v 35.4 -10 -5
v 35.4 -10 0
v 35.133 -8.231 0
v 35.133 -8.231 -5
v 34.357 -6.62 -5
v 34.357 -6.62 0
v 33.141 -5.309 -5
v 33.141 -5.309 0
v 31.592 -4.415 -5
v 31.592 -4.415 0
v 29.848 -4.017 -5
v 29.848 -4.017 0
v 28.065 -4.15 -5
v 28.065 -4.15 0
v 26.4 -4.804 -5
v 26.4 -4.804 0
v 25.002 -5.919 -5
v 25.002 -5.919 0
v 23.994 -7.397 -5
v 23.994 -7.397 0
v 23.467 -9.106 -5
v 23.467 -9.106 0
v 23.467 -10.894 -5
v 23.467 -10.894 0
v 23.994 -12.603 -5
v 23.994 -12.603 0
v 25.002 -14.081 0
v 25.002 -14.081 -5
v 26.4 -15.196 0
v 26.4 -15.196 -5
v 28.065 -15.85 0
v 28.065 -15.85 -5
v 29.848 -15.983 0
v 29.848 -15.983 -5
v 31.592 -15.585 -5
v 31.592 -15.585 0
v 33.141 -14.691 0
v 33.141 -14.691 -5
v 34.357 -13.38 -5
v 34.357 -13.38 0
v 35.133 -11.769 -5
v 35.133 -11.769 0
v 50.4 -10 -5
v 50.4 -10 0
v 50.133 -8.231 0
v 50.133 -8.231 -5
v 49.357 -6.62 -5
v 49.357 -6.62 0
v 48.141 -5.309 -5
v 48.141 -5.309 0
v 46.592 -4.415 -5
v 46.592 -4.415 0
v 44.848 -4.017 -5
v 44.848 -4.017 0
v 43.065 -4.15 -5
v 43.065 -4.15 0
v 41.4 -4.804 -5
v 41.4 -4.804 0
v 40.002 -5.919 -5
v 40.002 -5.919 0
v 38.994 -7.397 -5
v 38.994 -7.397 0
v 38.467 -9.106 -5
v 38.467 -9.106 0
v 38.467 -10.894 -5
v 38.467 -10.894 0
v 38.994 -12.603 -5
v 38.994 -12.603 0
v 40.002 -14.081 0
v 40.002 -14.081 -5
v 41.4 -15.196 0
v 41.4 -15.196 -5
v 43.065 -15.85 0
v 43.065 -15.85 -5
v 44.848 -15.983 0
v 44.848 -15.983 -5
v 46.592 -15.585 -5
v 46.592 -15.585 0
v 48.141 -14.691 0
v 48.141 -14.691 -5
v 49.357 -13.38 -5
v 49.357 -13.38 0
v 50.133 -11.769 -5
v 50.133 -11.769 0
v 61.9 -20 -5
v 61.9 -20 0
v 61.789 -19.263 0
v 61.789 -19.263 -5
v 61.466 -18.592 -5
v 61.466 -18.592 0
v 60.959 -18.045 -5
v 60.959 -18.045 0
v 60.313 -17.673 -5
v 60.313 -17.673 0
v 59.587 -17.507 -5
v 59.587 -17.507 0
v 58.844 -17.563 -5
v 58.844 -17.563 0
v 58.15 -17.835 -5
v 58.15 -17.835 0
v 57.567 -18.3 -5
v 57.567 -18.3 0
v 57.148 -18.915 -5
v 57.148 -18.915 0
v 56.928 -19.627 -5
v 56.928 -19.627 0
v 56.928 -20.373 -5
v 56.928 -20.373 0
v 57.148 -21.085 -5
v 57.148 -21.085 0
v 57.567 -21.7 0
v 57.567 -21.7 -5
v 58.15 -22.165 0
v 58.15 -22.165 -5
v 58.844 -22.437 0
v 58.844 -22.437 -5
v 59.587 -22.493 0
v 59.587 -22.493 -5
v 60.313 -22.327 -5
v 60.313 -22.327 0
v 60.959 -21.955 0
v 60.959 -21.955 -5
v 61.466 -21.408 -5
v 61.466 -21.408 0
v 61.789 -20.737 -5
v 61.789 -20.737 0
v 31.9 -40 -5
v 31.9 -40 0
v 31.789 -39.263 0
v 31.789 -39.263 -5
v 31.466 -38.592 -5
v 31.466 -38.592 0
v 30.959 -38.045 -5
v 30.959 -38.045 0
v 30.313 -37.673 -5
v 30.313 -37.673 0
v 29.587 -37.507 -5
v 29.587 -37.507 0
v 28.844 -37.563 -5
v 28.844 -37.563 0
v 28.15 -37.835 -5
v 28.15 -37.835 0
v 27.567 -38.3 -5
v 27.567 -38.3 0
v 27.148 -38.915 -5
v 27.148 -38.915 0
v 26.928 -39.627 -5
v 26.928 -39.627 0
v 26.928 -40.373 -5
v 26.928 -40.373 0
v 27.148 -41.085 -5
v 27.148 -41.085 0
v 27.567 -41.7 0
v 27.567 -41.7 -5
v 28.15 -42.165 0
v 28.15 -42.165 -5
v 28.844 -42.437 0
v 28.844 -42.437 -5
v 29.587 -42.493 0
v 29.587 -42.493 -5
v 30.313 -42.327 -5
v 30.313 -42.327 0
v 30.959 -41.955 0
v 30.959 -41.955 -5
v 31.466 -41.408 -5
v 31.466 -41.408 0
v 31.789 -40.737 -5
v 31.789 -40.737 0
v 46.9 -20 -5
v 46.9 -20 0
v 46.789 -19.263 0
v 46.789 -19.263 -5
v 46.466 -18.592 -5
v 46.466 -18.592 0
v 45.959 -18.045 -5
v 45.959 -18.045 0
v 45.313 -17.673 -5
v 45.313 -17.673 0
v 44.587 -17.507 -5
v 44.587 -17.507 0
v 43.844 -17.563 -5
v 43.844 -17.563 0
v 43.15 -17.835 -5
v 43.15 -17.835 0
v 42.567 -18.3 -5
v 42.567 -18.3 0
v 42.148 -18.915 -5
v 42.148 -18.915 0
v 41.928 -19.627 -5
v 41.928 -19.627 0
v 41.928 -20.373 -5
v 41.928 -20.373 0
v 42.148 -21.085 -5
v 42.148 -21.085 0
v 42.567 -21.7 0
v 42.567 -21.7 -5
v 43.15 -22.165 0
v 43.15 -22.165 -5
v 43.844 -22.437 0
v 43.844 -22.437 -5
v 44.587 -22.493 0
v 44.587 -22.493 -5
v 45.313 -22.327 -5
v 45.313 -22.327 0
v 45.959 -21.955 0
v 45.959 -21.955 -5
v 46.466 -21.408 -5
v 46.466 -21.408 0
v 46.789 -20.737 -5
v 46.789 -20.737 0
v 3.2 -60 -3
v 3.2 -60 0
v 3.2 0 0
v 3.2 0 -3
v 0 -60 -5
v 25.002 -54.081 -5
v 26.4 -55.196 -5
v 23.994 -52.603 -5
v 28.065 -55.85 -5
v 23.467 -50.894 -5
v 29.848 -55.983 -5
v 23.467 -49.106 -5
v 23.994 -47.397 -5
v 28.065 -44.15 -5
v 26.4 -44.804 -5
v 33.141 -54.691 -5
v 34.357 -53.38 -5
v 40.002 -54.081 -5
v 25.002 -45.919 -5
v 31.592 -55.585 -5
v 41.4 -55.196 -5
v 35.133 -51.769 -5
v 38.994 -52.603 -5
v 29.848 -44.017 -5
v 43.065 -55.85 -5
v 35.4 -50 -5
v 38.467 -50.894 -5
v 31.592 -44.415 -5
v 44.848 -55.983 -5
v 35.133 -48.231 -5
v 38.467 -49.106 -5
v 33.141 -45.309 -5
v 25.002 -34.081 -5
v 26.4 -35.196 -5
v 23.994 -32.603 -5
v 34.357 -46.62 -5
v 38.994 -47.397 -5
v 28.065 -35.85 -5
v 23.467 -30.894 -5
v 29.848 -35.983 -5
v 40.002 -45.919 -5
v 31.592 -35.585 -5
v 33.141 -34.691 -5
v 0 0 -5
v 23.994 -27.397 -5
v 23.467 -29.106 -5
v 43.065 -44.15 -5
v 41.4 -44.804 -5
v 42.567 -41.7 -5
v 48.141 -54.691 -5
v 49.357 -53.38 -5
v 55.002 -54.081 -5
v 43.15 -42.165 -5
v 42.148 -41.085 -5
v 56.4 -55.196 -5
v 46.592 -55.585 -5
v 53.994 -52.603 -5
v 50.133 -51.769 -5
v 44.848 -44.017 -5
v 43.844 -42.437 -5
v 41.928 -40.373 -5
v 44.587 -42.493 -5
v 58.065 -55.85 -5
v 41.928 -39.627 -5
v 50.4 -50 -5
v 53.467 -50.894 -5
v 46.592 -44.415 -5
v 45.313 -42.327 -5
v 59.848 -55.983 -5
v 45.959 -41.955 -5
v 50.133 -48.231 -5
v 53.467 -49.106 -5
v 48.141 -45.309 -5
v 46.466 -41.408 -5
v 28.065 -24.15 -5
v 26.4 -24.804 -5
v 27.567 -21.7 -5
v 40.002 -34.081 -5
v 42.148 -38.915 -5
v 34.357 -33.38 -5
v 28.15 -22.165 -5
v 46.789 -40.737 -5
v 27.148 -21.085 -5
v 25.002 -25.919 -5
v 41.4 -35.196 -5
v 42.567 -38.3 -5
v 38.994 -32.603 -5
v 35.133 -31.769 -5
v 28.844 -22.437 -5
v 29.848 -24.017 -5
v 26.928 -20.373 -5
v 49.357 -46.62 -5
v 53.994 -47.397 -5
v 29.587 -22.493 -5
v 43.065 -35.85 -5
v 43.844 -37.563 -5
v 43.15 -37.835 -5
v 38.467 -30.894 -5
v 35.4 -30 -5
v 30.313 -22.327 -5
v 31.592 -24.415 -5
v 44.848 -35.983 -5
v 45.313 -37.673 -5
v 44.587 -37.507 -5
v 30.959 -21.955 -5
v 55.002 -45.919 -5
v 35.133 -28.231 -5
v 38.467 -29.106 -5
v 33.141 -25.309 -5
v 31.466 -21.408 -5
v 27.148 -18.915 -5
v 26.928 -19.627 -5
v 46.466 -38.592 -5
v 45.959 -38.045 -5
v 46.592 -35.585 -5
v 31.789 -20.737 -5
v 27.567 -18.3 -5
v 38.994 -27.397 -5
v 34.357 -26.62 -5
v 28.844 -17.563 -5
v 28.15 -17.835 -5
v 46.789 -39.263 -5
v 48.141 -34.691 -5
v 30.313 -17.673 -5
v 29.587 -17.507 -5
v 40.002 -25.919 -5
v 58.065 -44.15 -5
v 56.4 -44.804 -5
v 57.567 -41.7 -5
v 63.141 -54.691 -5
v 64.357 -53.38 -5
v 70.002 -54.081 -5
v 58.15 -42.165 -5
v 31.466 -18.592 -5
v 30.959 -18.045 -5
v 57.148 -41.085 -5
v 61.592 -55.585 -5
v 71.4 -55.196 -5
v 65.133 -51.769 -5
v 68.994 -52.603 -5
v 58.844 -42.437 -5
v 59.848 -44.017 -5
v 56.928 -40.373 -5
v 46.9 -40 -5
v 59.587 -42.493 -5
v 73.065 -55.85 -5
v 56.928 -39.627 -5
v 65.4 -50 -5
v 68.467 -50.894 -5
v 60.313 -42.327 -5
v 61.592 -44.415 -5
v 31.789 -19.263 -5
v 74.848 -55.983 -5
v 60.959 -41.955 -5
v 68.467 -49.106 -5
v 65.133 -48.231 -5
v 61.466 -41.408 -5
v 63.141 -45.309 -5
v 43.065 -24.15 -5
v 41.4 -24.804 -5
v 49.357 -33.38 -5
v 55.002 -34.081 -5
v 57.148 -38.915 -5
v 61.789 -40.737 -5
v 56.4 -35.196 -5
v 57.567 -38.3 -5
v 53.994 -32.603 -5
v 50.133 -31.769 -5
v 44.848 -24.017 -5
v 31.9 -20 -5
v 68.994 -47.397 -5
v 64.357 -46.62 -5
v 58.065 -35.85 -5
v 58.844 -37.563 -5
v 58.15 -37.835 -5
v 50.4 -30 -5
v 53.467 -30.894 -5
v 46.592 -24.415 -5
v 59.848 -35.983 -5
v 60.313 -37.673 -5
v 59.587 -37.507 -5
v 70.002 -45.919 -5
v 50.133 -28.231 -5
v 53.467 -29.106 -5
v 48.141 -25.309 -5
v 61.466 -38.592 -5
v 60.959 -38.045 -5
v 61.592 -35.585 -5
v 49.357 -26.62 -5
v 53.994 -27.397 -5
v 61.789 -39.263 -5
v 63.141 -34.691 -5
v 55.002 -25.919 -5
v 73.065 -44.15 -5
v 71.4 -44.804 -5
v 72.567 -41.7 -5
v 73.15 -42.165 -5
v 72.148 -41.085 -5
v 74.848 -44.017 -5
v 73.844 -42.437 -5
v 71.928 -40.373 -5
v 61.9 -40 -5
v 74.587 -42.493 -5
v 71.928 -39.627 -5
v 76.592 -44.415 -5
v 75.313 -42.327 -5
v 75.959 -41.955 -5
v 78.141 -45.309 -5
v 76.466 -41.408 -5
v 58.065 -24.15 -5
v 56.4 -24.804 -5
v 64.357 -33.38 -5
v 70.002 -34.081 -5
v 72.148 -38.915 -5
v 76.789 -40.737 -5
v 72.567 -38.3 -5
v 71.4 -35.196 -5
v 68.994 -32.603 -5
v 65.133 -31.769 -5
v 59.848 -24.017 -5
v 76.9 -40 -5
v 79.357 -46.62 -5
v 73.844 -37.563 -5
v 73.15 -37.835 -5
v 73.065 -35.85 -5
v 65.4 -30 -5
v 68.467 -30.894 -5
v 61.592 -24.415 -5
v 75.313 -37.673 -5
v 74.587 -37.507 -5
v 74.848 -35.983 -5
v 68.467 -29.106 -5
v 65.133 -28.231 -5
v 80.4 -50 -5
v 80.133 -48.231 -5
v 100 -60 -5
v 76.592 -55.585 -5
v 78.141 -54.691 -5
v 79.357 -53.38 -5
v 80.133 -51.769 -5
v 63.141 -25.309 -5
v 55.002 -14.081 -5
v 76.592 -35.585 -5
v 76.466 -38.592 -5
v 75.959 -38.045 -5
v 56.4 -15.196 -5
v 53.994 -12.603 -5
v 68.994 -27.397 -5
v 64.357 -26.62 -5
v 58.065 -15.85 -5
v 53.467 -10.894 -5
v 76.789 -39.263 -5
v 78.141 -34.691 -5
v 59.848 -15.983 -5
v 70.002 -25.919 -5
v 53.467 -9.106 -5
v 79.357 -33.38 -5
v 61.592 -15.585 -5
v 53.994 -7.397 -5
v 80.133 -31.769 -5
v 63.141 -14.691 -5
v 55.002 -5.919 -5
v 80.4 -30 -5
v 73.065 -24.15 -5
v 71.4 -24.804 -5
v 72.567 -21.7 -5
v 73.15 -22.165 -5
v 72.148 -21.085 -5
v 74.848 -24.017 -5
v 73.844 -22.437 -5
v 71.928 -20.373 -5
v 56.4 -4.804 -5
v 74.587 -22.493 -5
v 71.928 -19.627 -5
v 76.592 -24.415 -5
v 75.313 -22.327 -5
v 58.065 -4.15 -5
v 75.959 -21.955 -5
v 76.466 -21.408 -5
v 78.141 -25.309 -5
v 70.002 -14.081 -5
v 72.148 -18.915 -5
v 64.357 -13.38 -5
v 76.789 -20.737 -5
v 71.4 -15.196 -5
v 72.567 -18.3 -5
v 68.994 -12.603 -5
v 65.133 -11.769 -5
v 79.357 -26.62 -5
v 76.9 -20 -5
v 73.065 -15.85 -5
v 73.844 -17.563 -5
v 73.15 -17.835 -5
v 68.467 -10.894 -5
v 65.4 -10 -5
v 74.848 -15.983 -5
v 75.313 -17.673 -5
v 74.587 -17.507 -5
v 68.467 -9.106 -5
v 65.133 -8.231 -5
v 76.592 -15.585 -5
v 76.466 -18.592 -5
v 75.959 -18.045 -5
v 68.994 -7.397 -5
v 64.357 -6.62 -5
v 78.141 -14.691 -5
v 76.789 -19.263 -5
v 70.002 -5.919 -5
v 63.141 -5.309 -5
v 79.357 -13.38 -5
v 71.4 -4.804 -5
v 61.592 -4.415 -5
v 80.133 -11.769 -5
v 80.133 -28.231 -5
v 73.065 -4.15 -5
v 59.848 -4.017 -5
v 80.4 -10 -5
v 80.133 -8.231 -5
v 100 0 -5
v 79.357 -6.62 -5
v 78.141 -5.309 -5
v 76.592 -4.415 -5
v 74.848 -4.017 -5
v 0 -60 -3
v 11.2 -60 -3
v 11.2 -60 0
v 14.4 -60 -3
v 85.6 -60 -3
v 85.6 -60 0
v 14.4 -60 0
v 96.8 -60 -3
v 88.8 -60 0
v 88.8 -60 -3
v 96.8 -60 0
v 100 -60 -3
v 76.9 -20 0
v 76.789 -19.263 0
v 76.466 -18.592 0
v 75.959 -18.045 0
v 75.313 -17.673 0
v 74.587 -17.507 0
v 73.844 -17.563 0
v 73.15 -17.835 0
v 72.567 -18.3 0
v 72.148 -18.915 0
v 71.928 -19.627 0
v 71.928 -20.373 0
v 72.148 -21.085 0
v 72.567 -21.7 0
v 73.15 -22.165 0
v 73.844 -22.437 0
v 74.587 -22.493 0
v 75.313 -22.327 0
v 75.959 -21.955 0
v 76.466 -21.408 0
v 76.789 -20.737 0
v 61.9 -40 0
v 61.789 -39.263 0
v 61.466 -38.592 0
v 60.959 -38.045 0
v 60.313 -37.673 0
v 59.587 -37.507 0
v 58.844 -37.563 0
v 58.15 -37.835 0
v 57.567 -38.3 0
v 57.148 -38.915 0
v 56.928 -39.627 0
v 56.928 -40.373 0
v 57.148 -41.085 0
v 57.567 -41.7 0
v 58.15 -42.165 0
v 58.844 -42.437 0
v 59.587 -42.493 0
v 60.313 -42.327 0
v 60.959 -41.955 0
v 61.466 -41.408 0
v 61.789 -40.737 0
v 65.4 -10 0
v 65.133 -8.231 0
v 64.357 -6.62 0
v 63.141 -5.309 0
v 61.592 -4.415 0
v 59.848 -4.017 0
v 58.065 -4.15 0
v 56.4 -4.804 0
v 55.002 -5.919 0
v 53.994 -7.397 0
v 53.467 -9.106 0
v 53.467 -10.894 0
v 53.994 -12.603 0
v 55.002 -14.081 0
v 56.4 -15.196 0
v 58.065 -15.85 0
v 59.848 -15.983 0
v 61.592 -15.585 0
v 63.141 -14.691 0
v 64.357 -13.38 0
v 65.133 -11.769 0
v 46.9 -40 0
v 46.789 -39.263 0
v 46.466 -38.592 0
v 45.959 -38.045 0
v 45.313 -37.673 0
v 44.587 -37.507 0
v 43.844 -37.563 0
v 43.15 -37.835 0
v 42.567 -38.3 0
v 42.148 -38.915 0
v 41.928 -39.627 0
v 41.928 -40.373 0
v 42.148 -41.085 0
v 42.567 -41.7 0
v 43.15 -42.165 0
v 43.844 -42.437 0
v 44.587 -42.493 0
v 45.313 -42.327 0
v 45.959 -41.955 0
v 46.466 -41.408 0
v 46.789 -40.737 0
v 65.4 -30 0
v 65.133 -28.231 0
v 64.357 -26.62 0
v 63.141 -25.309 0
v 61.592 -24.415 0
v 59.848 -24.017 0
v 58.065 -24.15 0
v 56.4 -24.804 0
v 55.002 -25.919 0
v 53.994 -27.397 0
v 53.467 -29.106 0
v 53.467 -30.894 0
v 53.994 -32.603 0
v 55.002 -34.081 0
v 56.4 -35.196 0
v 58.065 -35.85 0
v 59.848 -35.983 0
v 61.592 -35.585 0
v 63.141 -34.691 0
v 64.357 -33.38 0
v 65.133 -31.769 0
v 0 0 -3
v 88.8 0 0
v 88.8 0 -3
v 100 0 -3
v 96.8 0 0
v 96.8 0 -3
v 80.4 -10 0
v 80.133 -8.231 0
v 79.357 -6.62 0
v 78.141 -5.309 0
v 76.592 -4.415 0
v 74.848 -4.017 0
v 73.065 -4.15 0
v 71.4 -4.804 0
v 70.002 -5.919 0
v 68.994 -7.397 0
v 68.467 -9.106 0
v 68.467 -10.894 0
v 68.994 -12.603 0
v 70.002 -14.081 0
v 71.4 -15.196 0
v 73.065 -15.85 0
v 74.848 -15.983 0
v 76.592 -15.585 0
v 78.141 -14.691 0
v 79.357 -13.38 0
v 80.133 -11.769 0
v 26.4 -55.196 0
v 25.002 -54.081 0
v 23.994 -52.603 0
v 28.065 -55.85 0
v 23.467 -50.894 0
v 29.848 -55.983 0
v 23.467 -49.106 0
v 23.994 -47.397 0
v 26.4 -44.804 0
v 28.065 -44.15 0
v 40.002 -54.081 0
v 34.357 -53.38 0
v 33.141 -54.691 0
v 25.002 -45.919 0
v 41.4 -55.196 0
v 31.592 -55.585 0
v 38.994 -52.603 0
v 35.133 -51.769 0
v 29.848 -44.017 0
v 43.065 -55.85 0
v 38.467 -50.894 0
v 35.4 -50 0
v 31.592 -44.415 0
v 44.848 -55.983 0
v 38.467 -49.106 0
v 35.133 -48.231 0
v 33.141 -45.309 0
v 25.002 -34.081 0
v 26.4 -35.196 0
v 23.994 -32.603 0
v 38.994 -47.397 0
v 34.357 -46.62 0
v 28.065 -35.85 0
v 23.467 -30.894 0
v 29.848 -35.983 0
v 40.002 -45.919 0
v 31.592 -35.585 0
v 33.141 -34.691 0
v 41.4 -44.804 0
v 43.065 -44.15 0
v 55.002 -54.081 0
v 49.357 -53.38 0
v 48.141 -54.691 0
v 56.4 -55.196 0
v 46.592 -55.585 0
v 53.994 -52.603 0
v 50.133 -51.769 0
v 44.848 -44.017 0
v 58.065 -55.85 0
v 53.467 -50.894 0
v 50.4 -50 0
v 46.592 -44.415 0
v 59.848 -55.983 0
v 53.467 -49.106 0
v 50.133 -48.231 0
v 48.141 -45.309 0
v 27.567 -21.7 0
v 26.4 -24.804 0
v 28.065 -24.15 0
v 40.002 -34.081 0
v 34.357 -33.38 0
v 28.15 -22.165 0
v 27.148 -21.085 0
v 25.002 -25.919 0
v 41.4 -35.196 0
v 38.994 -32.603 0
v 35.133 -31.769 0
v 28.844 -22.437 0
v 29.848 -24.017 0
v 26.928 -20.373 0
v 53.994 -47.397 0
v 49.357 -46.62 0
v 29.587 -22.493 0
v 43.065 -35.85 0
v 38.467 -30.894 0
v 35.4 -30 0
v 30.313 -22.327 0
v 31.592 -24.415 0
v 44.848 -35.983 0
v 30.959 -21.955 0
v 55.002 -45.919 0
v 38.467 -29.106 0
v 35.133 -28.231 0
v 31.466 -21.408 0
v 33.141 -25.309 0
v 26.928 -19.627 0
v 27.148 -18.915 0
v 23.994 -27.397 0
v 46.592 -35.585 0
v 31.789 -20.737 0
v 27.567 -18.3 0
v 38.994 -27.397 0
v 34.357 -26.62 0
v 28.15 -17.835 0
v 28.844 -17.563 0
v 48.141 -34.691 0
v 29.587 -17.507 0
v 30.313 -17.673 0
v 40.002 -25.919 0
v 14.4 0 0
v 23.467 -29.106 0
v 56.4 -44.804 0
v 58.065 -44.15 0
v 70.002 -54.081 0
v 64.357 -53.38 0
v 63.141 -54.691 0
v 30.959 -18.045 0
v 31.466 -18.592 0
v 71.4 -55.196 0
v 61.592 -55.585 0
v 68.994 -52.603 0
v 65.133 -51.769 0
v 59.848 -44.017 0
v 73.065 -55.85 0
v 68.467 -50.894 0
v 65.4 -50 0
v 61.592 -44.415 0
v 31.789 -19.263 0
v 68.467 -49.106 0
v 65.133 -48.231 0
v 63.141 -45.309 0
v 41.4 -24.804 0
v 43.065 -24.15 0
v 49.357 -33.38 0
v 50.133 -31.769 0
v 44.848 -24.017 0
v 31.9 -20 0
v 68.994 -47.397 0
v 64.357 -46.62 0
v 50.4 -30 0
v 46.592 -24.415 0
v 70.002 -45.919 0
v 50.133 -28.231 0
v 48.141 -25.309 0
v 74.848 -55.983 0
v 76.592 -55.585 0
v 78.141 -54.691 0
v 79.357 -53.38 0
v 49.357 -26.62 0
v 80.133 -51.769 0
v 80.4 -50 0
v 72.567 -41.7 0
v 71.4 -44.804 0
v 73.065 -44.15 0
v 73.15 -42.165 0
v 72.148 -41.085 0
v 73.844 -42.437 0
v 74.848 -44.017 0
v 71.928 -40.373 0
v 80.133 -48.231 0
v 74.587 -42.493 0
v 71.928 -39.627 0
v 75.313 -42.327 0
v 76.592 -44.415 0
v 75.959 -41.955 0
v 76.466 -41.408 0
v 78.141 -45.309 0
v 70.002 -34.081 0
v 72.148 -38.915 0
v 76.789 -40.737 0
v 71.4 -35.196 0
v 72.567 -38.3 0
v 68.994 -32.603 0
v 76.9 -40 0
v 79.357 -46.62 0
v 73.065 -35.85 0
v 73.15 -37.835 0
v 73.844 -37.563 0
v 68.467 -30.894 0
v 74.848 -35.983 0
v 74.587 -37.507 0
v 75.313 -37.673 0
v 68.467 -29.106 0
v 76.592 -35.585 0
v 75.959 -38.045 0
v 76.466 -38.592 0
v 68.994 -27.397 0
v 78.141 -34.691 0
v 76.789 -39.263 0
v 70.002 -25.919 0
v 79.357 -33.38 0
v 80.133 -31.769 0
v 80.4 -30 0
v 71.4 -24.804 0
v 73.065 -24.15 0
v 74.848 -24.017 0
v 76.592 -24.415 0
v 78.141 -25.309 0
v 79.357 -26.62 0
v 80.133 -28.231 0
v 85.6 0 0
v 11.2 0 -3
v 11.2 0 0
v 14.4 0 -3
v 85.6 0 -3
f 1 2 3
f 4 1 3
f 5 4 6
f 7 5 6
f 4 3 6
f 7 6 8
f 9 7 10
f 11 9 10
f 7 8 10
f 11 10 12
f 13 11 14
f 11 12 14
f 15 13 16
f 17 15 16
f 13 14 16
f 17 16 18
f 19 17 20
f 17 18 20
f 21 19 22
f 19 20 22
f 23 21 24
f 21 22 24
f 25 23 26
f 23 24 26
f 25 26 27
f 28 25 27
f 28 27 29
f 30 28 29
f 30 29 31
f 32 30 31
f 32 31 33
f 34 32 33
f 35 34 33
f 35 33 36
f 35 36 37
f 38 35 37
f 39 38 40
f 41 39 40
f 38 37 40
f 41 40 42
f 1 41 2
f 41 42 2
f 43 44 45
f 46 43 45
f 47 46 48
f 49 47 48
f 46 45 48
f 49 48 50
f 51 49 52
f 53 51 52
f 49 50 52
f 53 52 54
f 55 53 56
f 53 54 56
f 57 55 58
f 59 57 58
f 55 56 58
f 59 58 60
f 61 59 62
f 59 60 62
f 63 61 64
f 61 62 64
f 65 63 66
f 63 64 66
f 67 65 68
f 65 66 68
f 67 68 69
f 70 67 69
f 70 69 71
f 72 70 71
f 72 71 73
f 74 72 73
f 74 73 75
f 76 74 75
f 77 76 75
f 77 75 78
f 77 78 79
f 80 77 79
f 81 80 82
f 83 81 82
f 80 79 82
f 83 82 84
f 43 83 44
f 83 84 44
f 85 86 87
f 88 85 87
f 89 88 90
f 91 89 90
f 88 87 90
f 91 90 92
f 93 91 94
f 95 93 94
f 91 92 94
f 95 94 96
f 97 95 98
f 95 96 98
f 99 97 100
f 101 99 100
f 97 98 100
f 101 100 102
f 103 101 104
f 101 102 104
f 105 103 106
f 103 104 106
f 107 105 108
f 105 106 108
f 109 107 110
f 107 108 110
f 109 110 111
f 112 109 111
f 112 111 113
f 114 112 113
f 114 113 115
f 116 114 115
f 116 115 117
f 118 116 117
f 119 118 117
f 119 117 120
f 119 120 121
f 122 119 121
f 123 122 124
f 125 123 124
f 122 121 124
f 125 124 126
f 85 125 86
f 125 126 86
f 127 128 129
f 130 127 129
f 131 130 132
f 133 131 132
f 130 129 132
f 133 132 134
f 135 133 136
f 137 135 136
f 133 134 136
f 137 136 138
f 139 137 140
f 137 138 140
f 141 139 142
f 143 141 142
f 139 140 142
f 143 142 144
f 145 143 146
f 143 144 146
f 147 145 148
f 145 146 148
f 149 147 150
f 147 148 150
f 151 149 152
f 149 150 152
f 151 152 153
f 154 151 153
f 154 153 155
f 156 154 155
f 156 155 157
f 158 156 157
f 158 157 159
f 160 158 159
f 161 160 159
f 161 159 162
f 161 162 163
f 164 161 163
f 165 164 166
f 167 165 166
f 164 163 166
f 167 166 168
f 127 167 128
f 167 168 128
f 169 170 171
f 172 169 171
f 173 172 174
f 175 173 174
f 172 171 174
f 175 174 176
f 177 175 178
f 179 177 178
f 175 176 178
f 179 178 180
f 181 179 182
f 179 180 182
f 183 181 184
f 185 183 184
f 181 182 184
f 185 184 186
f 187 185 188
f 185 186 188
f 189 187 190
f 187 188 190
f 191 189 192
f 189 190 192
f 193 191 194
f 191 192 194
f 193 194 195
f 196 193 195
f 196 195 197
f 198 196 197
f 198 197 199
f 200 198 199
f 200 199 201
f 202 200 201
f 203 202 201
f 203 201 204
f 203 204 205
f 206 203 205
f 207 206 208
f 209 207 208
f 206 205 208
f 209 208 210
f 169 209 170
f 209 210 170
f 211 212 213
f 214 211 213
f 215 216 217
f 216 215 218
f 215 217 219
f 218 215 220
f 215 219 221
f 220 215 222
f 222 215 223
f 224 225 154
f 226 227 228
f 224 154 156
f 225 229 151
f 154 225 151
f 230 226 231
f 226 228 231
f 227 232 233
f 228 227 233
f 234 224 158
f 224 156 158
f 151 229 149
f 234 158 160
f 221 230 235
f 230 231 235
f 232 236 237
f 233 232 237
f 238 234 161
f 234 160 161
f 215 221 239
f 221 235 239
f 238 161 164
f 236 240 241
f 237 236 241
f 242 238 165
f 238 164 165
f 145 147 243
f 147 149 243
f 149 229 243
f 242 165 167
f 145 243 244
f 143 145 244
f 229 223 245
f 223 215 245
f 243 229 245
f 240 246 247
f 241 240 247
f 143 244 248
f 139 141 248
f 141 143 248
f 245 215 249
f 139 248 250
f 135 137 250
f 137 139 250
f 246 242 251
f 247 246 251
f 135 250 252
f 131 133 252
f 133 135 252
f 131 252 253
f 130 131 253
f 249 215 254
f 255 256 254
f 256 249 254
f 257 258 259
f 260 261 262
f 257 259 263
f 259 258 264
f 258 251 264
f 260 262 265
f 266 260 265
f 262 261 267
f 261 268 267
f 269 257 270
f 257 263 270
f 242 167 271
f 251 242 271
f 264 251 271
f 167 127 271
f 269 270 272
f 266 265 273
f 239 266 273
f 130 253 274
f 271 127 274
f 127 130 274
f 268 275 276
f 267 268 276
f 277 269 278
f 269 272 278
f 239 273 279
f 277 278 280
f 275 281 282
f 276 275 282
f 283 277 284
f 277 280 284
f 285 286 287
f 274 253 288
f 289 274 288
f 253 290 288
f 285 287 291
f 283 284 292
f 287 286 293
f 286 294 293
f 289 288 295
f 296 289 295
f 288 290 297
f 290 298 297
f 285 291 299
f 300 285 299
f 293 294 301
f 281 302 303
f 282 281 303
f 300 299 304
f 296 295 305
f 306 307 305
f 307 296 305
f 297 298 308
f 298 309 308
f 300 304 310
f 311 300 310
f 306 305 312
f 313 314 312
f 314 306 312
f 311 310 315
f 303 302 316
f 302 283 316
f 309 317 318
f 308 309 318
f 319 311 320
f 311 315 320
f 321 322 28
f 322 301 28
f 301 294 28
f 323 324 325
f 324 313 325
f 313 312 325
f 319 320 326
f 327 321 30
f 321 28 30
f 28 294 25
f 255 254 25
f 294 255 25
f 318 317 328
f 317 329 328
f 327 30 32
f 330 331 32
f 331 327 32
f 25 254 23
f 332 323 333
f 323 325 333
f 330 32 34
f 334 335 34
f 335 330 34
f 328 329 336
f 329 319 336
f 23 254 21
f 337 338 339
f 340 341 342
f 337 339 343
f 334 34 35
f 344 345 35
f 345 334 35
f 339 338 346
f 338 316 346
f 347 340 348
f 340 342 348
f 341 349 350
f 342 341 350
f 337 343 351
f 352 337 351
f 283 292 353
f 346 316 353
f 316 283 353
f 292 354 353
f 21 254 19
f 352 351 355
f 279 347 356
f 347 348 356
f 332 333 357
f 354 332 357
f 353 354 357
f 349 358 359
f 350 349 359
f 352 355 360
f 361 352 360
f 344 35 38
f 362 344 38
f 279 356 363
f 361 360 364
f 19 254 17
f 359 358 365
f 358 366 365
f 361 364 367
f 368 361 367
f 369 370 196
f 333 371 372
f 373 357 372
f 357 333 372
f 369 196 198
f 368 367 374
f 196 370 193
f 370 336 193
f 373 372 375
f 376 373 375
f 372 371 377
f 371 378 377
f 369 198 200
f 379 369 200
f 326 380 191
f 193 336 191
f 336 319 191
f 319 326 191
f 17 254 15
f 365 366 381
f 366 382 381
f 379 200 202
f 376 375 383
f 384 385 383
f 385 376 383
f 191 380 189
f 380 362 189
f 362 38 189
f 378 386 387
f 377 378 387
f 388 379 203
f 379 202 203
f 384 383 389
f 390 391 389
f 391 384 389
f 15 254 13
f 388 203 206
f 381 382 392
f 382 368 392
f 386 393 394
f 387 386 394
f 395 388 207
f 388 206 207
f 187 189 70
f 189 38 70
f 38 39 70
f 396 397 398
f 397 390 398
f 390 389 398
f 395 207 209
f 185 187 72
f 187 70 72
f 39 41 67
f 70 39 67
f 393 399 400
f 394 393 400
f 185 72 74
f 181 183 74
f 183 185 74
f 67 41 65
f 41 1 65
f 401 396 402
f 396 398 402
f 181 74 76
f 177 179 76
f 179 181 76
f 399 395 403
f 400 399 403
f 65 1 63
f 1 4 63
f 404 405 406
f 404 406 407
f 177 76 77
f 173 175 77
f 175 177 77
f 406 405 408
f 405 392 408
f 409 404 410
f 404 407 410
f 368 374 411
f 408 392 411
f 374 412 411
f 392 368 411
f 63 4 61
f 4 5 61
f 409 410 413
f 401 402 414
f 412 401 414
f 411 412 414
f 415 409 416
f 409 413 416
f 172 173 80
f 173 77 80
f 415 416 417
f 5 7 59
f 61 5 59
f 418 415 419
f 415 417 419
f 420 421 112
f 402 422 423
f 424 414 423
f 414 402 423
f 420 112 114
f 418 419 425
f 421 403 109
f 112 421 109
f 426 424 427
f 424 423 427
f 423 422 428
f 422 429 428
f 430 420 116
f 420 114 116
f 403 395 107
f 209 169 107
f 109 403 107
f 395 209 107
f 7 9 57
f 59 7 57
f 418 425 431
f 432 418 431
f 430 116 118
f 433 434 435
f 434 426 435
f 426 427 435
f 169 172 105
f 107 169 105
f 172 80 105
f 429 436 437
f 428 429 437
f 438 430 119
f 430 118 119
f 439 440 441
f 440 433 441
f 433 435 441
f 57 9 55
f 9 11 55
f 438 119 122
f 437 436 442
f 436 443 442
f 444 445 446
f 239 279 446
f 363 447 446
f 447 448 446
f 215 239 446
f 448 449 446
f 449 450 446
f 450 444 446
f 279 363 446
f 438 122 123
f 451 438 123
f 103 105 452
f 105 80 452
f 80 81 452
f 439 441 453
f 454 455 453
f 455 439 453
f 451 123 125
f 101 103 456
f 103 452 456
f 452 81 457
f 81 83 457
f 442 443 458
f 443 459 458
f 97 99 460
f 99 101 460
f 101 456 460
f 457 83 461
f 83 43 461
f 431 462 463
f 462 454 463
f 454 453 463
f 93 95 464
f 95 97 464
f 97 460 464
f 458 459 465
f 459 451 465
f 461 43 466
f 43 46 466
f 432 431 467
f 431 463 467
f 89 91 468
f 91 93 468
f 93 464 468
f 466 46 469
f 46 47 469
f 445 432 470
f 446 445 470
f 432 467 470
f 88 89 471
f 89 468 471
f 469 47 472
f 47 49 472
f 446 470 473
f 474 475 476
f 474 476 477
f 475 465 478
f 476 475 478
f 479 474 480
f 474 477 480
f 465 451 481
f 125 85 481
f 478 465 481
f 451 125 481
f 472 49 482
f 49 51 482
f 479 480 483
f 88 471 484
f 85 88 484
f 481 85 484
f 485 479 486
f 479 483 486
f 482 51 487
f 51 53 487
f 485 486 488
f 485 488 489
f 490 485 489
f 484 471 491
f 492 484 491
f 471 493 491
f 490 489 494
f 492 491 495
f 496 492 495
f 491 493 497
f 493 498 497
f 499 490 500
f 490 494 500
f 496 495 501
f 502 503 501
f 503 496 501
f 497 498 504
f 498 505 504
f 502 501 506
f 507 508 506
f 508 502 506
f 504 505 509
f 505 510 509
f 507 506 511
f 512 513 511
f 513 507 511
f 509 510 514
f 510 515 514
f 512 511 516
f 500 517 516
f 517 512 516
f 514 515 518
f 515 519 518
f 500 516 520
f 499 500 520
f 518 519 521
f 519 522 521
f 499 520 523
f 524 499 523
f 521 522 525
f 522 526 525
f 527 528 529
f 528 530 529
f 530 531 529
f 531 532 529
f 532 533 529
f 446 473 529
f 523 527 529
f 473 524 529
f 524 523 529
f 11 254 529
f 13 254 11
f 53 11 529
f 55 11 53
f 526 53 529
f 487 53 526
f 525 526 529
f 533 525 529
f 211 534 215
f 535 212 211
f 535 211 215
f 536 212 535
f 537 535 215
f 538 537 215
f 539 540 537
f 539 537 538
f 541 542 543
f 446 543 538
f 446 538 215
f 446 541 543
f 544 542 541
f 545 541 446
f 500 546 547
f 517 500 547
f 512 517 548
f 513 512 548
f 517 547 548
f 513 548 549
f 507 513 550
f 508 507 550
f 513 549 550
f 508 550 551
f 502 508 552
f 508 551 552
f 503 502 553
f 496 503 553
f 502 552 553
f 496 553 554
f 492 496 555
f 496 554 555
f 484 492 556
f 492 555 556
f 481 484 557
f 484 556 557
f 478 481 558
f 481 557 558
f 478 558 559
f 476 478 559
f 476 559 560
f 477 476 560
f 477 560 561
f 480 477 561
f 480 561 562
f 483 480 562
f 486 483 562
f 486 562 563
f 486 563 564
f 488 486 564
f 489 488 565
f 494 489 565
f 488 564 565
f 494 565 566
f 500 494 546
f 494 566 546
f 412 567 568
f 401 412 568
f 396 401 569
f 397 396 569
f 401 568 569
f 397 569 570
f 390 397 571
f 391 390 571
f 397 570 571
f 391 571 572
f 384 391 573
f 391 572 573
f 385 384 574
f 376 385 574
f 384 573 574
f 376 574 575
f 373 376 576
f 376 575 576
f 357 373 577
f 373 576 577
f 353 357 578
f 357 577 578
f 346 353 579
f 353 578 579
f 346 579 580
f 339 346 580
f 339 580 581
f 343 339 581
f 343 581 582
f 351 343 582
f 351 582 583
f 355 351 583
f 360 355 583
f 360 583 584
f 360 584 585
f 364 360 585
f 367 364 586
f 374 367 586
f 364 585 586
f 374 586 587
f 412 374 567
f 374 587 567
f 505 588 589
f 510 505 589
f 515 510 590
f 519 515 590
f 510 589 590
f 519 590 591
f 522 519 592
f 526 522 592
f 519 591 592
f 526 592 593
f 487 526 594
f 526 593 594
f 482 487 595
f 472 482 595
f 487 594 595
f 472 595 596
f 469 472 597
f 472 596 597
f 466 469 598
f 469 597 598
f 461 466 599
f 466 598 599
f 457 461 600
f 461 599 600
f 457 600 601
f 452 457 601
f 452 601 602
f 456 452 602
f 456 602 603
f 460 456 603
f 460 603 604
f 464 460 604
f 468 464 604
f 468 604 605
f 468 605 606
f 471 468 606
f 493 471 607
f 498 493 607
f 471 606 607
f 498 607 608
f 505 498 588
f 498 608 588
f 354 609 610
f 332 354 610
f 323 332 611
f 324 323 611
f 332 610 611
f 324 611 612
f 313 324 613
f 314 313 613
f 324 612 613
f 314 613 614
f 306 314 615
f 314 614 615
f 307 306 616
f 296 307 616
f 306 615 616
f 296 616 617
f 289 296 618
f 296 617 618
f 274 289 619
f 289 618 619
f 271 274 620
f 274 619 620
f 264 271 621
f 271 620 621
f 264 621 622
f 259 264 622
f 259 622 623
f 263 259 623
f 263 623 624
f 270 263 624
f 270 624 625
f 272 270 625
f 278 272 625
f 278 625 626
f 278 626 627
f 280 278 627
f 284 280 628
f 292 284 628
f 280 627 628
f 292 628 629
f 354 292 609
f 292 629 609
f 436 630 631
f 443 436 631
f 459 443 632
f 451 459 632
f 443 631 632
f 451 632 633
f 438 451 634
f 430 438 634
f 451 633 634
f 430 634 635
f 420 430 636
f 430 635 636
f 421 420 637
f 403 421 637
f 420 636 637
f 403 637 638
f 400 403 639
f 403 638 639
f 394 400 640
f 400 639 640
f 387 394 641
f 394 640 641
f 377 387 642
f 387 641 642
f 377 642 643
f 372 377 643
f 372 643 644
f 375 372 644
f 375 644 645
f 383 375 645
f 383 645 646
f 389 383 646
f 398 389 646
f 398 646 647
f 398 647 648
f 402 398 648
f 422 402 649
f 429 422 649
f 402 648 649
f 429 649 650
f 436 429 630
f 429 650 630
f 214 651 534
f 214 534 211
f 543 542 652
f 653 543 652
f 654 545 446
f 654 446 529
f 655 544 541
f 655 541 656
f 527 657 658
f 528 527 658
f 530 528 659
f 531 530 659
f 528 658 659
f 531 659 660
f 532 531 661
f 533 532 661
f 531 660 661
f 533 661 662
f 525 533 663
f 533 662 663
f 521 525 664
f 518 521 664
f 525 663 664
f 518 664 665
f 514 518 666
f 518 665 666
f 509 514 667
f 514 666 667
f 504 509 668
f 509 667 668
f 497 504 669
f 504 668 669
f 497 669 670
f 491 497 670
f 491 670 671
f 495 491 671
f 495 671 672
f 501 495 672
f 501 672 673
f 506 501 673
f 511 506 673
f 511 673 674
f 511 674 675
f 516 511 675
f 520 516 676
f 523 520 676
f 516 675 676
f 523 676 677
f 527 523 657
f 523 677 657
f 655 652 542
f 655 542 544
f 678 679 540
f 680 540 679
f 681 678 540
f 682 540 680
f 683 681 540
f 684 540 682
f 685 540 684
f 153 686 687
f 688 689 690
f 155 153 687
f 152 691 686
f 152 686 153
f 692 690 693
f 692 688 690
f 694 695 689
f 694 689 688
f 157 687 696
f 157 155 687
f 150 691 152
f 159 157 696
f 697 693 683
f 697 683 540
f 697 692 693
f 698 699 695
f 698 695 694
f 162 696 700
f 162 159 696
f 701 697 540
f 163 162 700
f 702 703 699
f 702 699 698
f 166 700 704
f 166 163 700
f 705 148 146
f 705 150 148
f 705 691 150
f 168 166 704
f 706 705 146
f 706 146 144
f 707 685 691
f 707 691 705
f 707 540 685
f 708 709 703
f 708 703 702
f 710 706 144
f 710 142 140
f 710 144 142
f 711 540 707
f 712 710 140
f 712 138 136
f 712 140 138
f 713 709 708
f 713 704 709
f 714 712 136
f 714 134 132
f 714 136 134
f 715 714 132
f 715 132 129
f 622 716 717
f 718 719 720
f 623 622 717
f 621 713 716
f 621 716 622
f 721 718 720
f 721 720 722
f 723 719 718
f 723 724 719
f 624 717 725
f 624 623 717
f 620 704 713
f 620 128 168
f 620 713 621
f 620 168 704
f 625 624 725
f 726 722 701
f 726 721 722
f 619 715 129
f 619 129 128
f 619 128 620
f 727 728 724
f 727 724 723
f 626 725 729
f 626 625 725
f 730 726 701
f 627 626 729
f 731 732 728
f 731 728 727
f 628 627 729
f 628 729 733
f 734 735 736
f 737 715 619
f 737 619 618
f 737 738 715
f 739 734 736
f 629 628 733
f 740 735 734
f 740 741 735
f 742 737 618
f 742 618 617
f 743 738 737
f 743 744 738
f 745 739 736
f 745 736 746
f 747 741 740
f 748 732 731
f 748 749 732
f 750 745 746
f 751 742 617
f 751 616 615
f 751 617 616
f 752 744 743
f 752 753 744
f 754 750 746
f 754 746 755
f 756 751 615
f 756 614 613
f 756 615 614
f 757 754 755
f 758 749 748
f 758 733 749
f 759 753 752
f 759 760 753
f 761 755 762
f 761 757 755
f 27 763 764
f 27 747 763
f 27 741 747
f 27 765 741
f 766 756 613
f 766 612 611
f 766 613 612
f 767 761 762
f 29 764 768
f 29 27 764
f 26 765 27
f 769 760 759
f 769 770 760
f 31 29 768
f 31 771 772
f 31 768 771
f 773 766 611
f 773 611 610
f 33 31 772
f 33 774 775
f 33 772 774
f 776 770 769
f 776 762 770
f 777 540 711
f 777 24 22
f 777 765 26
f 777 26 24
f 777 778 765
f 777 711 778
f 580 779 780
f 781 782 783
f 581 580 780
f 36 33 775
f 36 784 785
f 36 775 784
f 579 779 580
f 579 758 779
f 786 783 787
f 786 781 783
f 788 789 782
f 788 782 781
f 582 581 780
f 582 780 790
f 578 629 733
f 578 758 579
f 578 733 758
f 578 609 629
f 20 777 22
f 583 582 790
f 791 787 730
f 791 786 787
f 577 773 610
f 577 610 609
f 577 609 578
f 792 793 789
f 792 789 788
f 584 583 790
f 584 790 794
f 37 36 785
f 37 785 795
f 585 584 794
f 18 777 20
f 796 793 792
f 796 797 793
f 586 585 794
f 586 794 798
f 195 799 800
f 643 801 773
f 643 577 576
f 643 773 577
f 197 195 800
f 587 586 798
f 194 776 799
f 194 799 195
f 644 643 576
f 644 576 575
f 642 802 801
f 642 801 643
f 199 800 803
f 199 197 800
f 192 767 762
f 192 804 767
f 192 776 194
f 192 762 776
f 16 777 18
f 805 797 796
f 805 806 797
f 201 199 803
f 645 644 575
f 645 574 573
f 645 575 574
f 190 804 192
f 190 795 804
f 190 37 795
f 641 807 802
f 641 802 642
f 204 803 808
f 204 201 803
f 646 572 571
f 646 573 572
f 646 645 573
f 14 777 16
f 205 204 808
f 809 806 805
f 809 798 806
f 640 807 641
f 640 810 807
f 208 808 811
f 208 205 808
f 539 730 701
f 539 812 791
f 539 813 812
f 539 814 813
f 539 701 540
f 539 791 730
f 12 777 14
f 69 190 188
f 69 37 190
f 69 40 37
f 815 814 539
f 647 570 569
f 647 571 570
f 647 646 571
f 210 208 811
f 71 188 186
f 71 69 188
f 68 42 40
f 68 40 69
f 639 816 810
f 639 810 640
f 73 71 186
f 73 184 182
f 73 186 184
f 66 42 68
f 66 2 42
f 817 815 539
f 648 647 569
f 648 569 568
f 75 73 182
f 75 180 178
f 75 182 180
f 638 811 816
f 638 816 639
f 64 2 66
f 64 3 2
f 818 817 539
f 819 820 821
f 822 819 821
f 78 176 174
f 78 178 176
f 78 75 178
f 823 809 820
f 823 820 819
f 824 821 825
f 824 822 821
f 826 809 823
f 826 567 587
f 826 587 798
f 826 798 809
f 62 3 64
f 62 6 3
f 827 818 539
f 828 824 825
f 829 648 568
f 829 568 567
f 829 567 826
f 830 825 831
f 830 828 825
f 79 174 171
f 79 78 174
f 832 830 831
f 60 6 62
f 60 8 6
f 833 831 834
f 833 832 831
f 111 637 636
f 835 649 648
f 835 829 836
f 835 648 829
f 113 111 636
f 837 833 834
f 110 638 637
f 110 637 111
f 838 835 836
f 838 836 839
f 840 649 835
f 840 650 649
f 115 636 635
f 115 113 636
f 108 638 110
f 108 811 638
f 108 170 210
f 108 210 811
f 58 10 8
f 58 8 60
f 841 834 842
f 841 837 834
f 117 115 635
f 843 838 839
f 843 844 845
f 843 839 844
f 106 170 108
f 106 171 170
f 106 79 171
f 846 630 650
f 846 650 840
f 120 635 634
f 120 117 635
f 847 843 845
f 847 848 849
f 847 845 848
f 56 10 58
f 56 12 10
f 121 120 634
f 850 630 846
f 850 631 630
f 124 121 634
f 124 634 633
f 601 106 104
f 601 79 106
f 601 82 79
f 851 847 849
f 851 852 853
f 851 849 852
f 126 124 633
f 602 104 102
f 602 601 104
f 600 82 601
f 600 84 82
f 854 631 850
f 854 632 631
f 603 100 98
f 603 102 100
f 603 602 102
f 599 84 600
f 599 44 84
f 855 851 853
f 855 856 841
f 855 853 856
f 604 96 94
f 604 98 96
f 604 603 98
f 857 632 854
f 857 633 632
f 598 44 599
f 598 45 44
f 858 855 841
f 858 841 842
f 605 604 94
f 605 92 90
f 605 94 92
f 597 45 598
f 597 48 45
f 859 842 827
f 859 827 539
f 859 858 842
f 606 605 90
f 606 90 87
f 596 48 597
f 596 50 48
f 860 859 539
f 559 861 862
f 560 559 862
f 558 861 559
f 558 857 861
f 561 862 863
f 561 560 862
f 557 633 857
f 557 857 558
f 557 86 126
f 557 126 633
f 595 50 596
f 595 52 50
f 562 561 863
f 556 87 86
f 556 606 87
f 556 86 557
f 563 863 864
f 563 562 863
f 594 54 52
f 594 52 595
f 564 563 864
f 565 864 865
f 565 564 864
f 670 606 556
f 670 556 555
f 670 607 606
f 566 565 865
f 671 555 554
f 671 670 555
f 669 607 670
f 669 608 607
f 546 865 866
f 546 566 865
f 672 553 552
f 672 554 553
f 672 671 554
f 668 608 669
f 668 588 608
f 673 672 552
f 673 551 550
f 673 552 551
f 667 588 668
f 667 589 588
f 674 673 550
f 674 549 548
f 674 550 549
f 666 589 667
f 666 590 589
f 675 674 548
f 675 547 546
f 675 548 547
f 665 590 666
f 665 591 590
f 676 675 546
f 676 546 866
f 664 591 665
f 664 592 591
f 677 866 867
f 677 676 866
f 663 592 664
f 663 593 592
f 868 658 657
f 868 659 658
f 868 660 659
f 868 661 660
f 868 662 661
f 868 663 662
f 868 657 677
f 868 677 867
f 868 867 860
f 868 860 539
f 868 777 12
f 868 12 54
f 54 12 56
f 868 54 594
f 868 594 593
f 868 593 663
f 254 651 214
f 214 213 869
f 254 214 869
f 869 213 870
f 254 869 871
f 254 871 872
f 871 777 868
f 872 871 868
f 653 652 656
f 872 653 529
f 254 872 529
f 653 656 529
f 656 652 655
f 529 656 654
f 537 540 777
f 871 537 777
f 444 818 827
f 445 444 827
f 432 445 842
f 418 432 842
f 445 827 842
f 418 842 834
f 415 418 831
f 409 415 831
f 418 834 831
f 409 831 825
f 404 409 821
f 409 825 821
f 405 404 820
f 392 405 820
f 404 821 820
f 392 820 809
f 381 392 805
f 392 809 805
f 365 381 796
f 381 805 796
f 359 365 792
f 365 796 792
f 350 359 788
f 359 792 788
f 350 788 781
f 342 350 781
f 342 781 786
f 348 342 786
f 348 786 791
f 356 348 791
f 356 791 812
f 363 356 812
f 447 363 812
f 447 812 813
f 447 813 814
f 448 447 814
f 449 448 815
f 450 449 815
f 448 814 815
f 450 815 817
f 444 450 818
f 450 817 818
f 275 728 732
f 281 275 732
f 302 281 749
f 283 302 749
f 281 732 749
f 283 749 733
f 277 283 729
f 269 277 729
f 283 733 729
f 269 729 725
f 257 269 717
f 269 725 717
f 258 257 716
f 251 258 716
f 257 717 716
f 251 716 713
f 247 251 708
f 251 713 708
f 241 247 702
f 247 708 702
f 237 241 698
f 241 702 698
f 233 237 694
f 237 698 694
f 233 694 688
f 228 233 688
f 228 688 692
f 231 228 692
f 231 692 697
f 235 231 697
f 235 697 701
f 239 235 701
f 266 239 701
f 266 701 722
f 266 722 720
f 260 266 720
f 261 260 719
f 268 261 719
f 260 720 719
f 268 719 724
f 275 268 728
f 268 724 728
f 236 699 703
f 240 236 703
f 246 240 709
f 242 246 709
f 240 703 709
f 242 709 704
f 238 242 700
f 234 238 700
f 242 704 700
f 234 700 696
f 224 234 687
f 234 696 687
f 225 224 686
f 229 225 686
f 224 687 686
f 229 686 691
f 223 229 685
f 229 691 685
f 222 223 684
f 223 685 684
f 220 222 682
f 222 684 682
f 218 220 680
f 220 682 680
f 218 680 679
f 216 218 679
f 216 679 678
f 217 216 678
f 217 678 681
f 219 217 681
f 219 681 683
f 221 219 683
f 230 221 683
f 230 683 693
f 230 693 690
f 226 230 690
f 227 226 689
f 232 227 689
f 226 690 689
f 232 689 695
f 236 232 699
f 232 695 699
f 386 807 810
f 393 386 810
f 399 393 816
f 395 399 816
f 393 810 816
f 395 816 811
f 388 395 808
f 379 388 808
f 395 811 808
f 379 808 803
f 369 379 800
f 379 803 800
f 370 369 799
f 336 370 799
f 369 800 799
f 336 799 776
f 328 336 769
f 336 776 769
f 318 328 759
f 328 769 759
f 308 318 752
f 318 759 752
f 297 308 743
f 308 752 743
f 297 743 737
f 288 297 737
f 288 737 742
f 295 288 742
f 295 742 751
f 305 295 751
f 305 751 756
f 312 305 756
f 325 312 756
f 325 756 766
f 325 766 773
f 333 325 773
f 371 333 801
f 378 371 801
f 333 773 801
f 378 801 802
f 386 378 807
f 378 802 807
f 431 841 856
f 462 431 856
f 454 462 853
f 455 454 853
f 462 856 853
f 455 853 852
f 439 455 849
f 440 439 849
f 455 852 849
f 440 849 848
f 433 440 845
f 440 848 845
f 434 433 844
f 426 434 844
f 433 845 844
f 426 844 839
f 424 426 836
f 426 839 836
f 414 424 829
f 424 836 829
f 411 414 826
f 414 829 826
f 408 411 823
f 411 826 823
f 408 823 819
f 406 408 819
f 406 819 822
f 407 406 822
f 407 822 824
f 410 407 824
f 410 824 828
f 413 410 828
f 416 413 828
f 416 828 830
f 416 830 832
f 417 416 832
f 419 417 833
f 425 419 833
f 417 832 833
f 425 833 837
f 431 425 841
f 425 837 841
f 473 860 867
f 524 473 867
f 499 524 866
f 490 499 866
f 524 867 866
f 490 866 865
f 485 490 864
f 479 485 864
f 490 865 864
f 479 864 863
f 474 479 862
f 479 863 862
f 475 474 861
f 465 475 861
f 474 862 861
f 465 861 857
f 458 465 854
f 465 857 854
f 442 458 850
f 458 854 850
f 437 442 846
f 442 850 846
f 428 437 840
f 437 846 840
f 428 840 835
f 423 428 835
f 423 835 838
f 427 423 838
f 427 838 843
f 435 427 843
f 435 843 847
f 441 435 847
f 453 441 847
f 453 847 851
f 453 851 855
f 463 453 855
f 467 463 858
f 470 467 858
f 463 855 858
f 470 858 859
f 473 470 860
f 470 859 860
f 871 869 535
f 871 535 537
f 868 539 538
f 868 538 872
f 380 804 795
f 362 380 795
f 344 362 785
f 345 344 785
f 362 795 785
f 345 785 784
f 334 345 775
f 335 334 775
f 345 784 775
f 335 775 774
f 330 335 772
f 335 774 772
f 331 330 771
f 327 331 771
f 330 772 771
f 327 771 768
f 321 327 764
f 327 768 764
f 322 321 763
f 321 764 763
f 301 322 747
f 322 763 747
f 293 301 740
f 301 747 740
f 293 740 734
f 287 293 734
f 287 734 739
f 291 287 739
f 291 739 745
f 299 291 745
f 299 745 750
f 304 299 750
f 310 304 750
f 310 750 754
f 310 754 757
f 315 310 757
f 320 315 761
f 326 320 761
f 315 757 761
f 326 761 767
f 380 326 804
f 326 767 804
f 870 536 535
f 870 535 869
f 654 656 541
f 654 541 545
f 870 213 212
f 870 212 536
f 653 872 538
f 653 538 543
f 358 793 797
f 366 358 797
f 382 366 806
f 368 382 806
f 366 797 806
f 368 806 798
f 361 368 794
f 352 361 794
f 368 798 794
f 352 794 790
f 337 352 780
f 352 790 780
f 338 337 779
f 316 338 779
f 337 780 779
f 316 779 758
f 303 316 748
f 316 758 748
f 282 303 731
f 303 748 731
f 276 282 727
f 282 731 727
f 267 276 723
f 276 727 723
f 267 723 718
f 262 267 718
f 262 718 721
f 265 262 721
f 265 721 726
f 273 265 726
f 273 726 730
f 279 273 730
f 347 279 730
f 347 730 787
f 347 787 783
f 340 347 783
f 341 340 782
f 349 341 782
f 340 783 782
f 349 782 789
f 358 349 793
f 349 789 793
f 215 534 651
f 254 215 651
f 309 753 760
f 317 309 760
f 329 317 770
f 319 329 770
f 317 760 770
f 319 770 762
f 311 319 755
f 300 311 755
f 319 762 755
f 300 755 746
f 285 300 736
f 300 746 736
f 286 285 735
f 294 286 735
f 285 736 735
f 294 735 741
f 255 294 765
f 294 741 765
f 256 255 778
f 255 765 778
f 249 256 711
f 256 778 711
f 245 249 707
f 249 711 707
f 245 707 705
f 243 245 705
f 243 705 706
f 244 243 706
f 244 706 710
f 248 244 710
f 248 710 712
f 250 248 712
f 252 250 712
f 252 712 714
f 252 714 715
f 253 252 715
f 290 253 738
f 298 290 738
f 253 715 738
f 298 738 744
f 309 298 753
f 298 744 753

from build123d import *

# Parameters (mm, degrees)
F0_W     = 100
F0_H     = 60
F1_DEPTH = 5
F2_W     = 3.2
F2_H     = 60
F3_DEPTH = 3
F4_R     = 6
F4_R_2   = 2.5
F5_DEPTH = 5


with BuildPart() as f1:
    # F0 (on Top) → F1 (new body)
    with BuildSketch(Plane.XY):
        with Locations((50, -30)):
            Rectangle(F0_W, F0_H)
    extrude(amount=-F1_DEPTH)

    # F2 (on face) → F3 (cut)
    with BuildSketch(Plane.XY):
        with Locations((1.6, -30)):
            Rectangle(F2_W, F2_H)
        with Locations((12.8, -30)):
            Rectangle(F2_W, F2_H)
        with Locations((87.2, -30)):
            Rectangle(F2_W, F2_H)
        with Locations((98.4, -30)):
            Rectangle(F2_W, F2_H)
    extrude(amount=-F3_DEPTH, mode=Mode.SUBTRACT)

    # F4 (on face) → F5 (cut)
    with BuildSketch(Plane.XY):
        with Locations((29.4, -50)):
            Circle(F4_R)
        with Locations((44.4, -50)):
            Circle(F4_R)
        with Locations((59.4, -50)):
            Circle(F4_R)
        with Locations((74.4, -50)):
            Circle(F4_R)
        with Locations((74.4, -40)):
            Circle(F4_R_2)
        with Locations((59.4, -40)):
            Circle(F4_R_2)
        with Locations((44.4, -40)):
            Circle(F4_R_2)
        with Locations((29.4, -40)):
            Circle(F4_R_2)
        with Locations((29.4, -30)):
            Circle(F4_R)
        with Locations((44.4, -30)):
            Circle(F4_R)
        with Locations((59.4, -30)):
            Circle(F4_R)
        with Locations((74.4, -30)):
            Circle(F4_R)
        with Locations((74.4, -20)):
            Circle(F4_R_2)
        with Locations((59.4, -20)):
            Circle(F4_R_2)
        with Locations((44.4, -20)):
            Circle(F4_R_2)
        with Locations((29.4, -20)):
            Circle(F4_R_2)
        with Locations((74.4, -10)):
            Circle(F4_R)
        with Locations((59.4, -10)):
            Circle(F4_R)
        with Locations((44.4, -10)):
            Circle(F4_R)
        with Locations((29.4, -10)):
            Circle(F4_R)
    extrude(amount=-F5_DEPTH, mode=Mode.SUBTRACT)


solid = f1.part
